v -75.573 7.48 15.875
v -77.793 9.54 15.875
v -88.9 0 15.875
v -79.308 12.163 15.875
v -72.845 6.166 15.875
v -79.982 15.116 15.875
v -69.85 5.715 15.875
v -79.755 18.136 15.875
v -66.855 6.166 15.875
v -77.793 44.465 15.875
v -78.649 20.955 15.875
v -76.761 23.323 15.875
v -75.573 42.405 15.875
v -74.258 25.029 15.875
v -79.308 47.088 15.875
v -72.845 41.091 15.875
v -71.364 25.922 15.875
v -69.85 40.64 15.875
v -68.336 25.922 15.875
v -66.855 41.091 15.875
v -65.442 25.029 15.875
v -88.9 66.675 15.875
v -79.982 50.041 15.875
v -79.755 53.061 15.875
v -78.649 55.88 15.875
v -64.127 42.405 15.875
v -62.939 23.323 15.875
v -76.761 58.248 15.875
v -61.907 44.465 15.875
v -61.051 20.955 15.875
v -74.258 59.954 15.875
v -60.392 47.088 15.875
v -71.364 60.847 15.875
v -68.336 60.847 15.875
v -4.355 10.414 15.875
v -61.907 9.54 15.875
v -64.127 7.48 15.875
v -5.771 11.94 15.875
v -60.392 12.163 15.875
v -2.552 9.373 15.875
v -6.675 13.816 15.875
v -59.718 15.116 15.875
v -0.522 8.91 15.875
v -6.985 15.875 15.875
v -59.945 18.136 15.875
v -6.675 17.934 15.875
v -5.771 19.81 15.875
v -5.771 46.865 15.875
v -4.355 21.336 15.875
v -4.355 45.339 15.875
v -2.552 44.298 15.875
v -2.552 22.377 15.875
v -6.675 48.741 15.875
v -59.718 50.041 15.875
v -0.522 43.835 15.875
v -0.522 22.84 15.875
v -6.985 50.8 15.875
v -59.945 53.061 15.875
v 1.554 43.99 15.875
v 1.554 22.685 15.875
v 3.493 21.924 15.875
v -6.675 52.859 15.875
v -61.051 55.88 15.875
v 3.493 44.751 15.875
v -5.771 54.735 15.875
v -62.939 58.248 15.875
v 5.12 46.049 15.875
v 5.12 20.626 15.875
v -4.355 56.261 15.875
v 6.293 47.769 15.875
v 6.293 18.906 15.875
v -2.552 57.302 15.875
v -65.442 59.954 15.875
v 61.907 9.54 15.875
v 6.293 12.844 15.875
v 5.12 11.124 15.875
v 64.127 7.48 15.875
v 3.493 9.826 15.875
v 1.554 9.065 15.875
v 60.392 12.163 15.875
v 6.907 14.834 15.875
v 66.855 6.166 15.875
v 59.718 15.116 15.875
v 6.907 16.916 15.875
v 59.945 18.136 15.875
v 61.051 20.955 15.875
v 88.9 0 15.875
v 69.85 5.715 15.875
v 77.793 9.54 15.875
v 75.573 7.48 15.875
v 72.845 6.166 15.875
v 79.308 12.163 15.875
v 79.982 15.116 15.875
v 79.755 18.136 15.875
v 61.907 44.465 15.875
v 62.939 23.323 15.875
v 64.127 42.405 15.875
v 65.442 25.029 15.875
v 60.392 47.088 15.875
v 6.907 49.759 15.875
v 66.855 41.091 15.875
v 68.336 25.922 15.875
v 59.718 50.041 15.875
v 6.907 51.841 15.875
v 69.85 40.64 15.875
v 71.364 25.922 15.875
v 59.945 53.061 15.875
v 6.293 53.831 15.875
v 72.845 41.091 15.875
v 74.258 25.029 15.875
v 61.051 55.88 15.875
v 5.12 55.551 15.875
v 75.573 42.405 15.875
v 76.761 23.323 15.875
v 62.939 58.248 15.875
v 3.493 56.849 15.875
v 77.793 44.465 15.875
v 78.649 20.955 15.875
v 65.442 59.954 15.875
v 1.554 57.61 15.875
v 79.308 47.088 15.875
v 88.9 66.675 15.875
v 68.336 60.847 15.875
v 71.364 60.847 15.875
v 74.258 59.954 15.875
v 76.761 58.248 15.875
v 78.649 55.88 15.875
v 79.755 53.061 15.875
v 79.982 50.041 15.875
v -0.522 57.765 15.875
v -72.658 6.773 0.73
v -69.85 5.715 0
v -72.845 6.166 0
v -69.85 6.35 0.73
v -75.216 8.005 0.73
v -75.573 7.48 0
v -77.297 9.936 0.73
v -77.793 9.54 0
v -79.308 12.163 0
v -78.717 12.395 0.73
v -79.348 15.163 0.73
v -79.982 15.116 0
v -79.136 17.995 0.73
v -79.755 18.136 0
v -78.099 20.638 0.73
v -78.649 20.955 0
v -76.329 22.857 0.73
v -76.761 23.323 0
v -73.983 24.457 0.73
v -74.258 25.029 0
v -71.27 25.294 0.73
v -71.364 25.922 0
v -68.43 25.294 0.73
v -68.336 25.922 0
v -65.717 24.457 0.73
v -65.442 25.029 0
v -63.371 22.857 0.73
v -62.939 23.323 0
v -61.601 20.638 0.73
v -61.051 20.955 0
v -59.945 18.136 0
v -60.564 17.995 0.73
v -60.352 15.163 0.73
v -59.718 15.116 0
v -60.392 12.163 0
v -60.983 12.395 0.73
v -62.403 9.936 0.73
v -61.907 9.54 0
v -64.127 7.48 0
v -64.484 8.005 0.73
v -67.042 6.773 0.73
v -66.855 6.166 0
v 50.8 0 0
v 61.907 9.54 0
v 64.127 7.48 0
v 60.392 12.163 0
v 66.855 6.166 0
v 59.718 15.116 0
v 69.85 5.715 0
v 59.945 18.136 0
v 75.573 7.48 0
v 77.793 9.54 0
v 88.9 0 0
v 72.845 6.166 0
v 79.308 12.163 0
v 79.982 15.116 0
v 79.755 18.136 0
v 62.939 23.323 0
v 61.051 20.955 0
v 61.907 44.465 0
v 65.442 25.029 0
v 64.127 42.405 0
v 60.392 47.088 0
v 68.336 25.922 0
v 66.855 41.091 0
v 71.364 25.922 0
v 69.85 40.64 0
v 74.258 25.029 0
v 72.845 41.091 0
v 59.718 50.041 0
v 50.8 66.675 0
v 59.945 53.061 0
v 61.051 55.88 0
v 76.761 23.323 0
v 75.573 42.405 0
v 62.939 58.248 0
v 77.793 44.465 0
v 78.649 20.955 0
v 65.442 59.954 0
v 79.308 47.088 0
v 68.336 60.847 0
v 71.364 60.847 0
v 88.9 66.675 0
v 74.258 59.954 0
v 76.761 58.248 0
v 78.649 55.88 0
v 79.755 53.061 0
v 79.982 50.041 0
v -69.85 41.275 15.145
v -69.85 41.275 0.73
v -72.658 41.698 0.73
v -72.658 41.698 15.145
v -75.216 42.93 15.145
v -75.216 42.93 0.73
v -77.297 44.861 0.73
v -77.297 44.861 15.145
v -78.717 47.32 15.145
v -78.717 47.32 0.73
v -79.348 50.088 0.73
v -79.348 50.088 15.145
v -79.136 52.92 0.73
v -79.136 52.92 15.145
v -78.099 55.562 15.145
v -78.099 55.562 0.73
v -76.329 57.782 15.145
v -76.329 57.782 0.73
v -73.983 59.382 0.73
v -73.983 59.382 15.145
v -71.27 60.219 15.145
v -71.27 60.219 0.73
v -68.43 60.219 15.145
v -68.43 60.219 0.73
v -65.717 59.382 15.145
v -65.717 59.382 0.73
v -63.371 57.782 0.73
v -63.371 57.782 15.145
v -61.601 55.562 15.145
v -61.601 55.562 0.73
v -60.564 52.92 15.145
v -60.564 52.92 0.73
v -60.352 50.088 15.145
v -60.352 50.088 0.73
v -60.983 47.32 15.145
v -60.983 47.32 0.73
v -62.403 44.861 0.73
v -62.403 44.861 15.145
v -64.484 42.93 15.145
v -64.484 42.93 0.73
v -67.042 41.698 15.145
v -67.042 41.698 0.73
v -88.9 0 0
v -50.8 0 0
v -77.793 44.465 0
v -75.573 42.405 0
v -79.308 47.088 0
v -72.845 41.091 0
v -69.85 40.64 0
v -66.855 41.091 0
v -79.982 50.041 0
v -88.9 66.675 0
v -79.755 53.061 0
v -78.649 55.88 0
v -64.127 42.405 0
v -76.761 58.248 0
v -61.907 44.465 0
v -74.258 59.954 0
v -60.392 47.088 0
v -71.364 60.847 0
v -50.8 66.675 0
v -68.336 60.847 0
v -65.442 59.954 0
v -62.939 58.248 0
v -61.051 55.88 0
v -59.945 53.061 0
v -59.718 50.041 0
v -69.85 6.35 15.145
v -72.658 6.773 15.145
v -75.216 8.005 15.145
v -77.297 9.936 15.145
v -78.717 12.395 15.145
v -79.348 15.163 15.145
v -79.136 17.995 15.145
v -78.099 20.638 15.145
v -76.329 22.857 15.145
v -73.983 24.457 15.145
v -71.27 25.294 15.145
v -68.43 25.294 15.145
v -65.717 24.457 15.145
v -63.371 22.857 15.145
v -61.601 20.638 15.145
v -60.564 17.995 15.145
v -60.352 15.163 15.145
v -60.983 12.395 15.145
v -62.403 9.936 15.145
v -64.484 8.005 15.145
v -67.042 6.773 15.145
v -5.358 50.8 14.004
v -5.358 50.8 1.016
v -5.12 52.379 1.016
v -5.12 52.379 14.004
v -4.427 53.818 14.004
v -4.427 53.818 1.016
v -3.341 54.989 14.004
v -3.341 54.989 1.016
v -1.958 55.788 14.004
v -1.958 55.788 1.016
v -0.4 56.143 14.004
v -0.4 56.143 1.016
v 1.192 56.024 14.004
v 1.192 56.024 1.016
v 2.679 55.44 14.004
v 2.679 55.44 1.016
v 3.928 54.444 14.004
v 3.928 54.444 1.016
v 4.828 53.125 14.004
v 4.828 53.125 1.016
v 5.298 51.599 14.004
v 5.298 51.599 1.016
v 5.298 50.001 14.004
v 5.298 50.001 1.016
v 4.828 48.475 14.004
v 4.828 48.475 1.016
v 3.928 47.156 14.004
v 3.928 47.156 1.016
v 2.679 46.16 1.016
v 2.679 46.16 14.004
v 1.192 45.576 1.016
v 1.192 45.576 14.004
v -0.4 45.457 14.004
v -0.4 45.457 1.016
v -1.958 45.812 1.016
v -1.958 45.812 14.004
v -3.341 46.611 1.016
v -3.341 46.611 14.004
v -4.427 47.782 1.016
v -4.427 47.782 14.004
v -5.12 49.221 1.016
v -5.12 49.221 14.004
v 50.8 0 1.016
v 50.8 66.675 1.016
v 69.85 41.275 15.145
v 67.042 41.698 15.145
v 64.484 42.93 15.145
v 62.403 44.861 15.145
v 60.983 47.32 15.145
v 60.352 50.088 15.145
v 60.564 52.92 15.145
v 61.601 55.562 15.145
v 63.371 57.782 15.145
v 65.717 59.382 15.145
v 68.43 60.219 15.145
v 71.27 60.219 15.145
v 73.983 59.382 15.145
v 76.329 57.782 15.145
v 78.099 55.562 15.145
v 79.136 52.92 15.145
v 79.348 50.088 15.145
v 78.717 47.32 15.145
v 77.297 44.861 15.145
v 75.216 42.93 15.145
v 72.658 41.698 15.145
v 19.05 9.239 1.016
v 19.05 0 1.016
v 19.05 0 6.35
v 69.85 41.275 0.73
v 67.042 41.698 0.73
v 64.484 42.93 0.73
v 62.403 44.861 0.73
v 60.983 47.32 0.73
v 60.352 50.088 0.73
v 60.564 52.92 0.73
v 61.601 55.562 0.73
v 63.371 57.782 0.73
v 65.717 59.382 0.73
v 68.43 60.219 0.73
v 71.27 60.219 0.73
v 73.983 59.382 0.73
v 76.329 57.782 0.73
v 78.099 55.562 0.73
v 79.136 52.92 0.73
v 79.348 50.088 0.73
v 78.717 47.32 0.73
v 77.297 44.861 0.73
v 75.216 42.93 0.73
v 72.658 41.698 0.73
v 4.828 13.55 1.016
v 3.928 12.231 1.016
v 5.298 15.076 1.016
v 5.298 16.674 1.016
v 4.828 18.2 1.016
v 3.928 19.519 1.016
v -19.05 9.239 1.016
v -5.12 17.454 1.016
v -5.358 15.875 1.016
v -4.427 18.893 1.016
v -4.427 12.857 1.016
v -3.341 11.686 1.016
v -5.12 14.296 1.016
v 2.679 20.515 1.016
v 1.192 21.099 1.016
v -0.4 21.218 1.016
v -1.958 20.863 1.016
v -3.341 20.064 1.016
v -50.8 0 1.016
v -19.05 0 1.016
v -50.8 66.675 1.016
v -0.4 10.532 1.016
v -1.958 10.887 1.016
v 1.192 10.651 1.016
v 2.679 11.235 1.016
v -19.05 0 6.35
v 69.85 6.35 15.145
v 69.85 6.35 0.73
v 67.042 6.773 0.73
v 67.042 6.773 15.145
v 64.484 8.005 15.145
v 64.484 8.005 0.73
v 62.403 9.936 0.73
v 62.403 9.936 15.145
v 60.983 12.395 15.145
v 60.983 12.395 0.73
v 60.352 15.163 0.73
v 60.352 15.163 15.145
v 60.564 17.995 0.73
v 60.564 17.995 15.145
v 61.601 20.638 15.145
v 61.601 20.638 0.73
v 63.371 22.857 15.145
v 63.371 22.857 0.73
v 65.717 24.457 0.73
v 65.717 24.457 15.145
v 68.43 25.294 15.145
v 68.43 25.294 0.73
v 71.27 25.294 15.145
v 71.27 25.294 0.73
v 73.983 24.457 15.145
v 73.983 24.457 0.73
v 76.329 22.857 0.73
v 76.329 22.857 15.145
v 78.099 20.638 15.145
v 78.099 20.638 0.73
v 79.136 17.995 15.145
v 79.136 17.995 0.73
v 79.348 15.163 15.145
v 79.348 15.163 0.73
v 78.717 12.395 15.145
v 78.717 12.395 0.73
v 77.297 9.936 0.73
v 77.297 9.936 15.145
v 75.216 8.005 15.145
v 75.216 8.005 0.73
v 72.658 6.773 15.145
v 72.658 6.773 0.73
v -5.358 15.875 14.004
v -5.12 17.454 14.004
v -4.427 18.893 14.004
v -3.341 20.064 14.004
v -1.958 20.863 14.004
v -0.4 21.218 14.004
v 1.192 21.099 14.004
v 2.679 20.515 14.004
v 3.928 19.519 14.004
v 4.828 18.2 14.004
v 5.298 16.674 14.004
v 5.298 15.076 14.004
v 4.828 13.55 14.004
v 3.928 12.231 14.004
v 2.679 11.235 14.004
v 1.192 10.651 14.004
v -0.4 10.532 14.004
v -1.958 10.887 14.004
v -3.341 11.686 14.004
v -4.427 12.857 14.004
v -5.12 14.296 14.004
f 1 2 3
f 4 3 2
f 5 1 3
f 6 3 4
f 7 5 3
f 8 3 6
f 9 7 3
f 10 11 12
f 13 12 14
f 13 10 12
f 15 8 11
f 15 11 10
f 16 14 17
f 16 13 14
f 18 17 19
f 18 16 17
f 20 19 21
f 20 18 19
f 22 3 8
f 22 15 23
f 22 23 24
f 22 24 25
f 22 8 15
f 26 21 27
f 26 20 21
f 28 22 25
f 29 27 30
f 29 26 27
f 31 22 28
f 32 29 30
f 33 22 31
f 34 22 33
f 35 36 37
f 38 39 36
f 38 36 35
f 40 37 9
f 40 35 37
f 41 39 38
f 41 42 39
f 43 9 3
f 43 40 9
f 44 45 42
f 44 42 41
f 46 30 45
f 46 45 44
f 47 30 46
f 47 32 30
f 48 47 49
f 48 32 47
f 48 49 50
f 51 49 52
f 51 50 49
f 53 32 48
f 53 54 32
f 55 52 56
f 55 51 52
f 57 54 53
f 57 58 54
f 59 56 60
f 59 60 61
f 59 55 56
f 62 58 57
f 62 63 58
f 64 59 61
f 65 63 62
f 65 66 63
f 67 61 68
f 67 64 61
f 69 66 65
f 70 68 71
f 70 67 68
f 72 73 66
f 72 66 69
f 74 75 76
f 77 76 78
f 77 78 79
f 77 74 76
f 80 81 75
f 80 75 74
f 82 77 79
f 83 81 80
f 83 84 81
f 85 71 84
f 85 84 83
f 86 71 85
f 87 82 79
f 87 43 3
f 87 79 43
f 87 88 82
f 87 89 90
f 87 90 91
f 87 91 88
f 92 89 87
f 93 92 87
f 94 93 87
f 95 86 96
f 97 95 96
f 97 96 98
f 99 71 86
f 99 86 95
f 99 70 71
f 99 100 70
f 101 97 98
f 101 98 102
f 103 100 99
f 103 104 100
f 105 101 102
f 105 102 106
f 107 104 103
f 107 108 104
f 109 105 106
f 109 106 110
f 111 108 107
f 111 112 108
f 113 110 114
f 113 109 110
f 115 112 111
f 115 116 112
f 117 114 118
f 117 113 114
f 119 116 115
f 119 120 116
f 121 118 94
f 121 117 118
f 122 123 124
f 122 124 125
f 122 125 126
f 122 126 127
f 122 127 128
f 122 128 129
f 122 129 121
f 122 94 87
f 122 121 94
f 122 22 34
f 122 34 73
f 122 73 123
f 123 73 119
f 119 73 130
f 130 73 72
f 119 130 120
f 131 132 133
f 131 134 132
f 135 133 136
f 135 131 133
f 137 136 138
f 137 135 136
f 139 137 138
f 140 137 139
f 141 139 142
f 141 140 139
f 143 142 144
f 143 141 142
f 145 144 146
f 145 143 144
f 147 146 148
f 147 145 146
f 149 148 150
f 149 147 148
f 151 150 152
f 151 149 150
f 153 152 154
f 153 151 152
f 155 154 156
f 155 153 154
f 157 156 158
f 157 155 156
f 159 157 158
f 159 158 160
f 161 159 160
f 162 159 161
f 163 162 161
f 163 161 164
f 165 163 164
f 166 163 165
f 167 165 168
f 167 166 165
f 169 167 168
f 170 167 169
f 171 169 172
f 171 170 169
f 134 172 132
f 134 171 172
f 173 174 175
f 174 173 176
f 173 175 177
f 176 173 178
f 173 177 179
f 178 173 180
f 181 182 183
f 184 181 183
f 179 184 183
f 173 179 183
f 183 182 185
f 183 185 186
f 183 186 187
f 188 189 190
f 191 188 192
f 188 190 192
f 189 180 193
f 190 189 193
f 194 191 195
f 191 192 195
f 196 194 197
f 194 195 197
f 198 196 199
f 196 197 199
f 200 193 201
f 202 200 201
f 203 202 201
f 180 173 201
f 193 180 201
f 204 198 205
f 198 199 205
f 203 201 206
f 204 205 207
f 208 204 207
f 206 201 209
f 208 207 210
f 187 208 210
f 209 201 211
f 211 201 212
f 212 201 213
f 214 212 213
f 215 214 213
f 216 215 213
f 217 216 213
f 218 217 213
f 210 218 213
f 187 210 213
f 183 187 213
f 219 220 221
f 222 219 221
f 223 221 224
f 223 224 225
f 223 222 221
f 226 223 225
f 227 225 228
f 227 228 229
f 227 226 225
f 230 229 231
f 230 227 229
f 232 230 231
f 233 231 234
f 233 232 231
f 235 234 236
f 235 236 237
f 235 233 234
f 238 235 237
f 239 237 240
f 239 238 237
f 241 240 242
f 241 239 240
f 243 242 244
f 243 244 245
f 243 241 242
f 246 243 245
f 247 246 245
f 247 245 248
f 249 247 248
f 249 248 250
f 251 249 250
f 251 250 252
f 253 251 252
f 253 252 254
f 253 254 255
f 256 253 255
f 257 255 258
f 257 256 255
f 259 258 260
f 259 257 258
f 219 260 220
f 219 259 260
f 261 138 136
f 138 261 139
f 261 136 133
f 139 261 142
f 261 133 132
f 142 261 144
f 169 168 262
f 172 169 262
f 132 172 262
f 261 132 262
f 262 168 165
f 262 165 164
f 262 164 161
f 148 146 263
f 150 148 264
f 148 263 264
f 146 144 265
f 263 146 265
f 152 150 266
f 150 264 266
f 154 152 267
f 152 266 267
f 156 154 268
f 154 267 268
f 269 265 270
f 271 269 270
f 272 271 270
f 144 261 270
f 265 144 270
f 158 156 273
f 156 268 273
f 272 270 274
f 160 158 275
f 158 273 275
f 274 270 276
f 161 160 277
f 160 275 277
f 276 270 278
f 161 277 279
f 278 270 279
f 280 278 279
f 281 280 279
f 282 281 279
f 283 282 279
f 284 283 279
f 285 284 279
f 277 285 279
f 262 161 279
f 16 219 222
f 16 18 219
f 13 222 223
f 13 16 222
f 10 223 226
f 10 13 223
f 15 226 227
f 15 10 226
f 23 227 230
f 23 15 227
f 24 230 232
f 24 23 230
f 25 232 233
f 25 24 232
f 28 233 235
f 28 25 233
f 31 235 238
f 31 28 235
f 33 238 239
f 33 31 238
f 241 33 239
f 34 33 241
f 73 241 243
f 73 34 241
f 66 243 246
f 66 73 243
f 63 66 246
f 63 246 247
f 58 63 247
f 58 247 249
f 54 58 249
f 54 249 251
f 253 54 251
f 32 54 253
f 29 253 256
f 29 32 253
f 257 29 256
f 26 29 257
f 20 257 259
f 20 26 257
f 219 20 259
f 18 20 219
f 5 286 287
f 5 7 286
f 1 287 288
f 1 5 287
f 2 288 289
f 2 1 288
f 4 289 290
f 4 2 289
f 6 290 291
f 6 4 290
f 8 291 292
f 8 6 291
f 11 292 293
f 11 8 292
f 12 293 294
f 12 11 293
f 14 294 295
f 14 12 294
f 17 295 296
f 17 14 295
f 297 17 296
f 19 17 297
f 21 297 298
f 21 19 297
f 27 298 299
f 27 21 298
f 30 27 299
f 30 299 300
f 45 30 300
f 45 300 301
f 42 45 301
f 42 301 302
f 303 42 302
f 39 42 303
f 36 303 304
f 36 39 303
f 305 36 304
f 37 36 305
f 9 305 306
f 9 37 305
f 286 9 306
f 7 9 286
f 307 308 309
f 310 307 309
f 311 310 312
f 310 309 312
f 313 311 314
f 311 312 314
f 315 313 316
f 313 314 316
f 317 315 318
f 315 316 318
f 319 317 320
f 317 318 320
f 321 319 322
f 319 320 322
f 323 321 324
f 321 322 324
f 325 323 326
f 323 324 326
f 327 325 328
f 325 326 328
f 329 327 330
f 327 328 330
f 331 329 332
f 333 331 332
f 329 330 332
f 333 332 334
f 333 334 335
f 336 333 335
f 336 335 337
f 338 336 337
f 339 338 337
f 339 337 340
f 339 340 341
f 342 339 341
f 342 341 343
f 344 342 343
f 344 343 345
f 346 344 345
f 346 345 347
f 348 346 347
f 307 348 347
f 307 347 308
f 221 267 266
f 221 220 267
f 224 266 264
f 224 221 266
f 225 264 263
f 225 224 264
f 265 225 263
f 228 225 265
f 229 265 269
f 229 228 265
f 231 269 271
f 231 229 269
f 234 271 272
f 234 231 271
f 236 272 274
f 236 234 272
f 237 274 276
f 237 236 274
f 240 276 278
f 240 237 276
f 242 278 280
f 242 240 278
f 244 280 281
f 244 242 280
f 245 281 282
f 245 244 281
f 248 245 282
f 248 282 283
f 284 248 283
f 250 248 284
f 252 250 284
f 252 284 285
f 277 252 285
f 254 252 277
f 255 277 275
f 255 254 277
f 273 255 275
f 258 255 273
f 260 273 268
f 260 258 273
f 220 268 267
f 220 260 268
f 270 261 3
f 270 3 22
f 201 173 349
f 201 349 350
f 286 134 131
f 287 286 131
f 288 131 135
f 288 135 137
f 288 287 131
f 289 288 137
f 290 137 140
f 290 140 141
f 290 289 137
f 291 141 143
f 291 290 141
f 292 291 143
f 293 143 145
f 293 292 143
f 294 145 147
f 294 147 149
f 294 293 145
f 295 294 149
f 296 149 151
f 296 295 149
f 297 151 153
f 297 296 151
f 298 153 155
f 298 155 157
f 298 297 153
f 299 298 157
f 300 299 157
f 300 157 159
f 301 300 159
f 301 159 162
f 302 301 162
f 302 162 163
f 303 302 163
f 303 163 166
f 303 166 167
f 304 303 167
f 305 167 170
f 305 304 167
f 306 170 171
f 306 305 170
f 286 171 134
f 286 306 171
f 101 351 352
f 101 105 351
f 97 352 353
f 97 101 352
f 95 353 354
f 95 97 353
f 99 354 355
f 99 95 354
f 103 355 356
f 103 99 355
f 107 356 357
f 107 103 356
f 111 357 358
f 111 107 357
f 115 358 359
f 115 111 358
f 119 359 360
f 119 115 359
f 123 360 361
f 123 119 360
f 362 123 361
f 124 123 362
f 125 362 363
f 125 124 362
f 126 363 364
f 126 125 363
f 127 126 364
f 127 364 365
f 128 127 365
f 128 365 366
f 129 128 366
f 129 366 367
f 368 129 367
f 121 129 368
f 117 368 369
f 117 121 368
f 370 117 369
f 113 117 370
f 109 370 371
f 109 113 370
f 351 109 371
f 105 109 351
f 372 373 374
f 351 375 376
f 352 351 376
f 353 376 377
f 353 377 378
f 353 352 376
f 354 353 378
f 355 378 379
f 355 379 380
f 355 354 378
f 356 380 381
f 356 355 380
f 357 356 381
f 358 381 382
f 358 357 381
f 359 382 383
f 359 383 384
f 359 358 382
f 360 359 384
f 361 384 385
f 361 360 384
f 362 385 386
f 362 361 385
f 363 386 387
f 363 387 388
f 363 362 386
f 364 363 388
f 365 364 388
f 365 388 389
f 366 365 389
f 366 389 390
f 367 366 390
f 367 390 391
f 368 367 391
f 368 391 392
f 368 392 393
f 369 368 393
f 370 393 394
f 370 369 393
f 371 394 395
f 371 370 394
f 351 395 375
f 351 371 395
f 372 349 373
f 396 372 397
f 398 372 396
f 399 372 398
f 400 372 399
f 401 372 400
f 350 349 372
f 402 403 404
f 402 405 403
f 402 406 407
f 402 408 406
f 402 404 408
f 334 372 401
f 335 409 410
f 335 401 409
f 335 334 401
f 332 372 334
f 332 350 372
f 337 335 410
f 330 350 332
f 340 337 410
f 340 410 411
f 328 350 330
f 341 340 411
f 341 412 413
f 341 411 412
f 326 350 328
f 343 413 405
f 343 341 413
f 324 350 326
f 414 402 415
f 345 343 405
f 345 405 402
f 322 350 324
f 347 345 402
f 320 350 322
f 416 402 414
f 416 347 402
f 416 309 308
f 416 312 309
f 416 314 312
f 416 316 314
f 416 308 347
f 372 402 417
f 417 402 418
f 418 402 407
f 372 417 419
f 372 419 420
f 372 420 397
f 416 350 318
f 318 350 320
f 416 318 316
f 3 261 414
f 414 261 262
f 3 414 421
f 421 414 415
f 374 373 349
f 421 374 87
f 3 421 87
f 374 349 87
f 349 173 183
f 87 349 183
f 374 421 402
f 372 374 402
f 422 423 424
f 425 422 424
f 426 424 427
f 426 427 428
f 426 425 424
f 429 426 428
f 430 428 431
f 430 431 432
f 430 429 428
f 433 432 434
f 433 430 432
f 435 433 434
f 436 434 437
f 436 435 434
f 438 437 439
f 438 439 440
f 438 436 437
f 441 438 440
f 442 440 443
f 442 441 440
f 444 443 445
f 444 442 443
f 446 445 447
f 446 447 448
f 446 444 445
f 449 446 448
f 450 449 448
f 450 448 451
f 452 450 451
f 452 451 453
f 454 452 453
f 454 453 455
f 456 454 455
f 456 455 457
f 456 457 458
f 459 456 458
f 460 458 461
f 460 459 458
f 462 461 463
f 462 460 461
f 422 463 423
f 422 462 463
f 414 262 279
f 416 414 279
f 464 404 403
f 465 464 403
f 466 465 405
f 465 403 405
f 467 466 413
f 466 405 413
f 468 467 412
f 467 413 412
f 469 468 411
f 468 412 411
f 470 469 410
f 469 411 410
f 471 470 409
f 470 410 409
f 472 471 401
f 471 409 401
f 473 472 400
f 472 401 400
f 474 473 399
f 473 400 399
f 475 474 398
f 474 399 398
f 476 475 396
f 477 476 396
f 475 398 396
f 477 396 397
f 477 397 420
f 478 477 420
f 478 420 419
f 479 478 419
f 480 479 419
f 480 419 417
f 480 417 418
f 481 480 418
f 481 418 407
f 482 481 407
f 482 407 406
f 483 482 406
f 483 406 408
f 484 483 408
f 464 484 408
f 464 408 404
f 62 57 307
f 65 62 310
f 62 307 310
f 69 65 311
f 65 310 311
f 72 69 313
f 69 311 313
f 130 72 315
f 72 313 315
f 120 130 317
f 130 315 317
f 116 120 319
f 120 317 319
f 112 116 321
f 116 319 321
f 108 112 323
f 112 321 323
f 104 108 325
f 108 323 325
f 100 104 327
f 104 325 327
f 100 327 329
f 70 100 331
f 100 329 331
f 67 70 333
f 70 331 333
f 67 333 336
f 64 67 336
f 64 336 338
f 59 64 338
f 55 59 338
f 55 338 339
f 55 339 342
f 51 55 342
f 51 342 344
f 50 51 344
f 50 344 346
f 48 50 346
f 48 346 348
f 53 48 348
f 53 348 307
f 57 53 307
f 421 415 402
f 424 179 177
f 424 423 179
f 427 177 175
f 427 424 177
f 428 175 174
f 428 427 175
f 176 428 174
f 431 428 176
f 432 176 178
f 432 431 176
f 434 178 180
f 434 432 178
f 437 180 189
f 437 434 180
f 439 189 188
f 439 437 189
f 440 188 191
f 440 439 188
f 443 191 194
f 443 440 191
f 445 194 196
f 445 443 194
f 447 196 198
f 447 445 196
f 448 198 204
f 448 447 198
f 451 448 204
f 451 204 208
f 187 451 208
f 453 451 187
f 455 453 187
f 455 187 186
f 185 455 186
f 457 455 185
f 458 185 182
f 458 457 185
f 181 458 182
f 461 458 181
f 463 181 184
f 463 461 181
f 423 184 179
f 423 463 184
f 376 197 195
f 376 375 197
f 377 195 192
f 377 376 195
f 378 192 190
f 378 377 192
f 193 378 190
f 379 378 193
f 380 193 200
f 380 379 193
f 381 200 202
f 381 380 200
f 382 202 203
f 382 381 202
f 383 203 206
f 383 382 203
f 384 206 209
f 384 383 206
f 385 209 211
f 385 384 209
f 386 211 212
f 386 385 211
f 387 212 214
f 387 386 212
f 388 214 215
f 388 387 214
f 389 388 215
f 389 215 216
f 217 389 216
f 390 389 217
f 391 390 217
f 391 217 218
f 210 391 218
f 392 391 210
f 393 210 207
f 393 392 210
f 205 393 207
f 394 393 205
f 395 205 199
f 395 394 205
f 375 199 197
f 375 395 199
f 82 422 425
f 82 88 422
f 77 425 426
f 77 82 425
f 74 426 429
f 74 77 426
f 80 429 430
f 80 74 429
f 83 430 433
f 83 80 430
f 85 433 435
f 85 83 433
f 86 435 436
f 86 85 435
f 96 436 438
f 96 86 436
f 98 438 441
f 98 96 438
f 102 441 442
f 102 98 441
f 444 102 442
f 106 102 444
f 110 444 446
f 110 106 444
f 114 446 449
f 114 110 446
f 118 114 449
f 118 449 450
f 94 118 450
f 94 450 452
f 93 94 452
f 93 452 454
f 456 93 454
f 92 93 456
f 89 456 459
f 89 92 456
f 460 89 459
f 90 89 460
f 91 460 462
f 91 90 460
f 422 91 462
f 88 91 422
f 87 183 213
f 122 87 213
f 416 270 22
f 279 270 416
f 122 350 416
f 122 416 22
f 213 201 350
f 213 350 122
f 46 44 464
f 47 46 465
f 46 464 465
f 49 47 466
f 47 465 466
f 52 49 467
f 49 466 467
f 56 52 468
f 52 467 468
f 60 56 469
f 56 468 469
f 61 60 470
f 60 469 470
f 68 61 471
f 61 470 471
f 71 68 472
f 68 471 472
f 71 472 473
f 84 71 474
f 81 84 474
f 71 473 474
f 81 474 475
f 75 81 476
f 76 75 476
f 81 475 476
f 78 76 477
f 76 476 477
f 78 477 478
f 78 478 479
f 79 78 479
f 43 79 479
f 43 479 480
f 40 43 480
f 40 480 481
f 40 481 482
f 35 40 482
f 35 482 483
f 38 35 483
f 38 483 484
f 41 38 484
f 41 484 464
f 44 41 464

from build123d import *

# Parameters (mm, degrees)
SKETCH1_W                         = 177.8
SKETCH1_H                         = 66.675
EXTRUDE1_DEPTH                    = 15.875
F_1_2_CLEARANCE_HOLE1_AT_2_COUNT  = 2
F_1_2_CLEARANCE_HOLE1_AT_2_PITCH  = 34.925
F_1_2_CLEARANCE_HOLE1_AT_3_COUNT  = 2
F_1_2_CLEARANCE_HOLE1_AT_3_PITCH  = 139.7
F_1_2_CLEARANCE_HOLE1_AT_4_COUNT  = 2
F_1_2_CLEARANCE_HOLE1_AT_4_PITCH  = 143.999463975
SKETCH15_W                        = 101.6
SKETCH15_H                        = 66.675
CUT_EXTRUDE1_DEPTH                = 1.016
CUT_EXTRUDE2_DEPTH                = 19.05
F_1_2_13_TAPPED_HOLE1_D           = 10.71626
F_1_2_13_TAPPED_HOLE1_DEPTH       = 14.859
F_1_2_13_TAPPED_HOLE1_CSINK_D     = 13.97
F_1_2_13_TAPPED_HOLE1_CSINK_ANGLE = 82


with BuildPart() as part:
    # Sketch1 → Extrude1 (new body)
    with BuildSketch(Plane.XY):
        with Locations((0, 33.3375)):
            Rectangle(SKETCH1_W, SKETCH1_H)
    extrude(amount=EXTRUDE1_DEPTH)

    # Sketch11 → 1/2 Clearance Hole1 (revolve, cut)
    with BuildSketch(Plane(origin=(-69.85, 50.8, 15.875), x_dir=(0, -1, 0), z_dir=(1, 0, 0))):
        Polygon((0, 0), (0, 15.875), (10.16, 15.875), (9.525, 15.144516061), (9.525, 0.730483939), (10.16, 0), align=None)
    f_1_2_clearance_hole1 = revolve(axis=Axis((-69.85, 50.8, 22.225), (0, 0, -1)), mode=Mode.SUBTRACT)

    # 1/2 Clearance Hole1 at 2: 1/2 Clearance Hole1 ×2
    with Locations(*[(0, -i * F_1_2_CLEARANCE_HOLE1_AT_2_PITCH, 0) for i in range(1, F_1_2_CLEARANCE_HOLE1_AT_2_COUNT)]):
        add(f_1_2_clearance_hole1, mode=Mode.SUBTRACT)

    # 1/2 Clearance Hole1 at 3: 1/2 Clearance Hole1 ×2
    with Locations(*[(i * F_1_2_CLEARANCE_HOLE1_AT_3_PITCH, 0, 0) for i in range(1, F_1_2_CLEARANCE_HOLE1_AT_3_COUNT)]):
        add(f_1_2_clearance_hole1, mode=Mode.SUBTRACT)

    # 1/2 Clearance Hole1 at 4: 1/2 Clearance Hole1 ×2
    with Locations(*[Vector(0.9701425, -0.242535625, 0) * (i * F_1_2_CLEARANCE_HOLE1_AT_4_PITCH) for i in range(1, F_1_2_CLEARANCE_HOLE1_AT_4_COUNT)]):
        add(f_1_2_clearance_hole1, mode=Mode.SUBTRACT)

    # Sketch15 → Cut-Extrude1 (cut)
    with BuildSketch(Plane(origin=(0, 0, 0), x_dir=(-1, 0, 0), z_dir=(0, 0, -1))):
        with Locations((0, 33.3375)):
            Rectangle(SKETCH15_W, SKETCH15_H)
    extrude(amount=-CUT_EXTRUDE1_DEPTH, mode=Mode.SUBTRACT)

    # Sketch17 → Cut-Extrude2 (cut, symmetric)
    with BuildSketch(Plane(origin=(0, 0, 0), x_dir=(0, 0, -1), z_dir=(1, 0, 0))):
        Polygon((-6.35, 0), (0, 10.998522628), (0, 0), align=None)
    extrude(amount=CUT_EXTRUDE2_DEPTH, both=True, mode=Mode.SUBTRACT)

    # 1/2-13 Tapped Hole1
    with Locations(Plane.XY.offset(15.875)):
        with Locations((0, 50.8), (0, 15.875)):
            CounterSinkHole(F_1_2_13_TAPPED_HOLE1_D / 2, F_1_2_13_TAPPED_HOLE1_CSINK_D / 2, depth=F_1_2_13_TAPPED_HOLE1_DEPTH, counter_sink_angle=F_1_2_13_TAPPED_HOLE1_CSINK_ANGLE)


solid = part.part
